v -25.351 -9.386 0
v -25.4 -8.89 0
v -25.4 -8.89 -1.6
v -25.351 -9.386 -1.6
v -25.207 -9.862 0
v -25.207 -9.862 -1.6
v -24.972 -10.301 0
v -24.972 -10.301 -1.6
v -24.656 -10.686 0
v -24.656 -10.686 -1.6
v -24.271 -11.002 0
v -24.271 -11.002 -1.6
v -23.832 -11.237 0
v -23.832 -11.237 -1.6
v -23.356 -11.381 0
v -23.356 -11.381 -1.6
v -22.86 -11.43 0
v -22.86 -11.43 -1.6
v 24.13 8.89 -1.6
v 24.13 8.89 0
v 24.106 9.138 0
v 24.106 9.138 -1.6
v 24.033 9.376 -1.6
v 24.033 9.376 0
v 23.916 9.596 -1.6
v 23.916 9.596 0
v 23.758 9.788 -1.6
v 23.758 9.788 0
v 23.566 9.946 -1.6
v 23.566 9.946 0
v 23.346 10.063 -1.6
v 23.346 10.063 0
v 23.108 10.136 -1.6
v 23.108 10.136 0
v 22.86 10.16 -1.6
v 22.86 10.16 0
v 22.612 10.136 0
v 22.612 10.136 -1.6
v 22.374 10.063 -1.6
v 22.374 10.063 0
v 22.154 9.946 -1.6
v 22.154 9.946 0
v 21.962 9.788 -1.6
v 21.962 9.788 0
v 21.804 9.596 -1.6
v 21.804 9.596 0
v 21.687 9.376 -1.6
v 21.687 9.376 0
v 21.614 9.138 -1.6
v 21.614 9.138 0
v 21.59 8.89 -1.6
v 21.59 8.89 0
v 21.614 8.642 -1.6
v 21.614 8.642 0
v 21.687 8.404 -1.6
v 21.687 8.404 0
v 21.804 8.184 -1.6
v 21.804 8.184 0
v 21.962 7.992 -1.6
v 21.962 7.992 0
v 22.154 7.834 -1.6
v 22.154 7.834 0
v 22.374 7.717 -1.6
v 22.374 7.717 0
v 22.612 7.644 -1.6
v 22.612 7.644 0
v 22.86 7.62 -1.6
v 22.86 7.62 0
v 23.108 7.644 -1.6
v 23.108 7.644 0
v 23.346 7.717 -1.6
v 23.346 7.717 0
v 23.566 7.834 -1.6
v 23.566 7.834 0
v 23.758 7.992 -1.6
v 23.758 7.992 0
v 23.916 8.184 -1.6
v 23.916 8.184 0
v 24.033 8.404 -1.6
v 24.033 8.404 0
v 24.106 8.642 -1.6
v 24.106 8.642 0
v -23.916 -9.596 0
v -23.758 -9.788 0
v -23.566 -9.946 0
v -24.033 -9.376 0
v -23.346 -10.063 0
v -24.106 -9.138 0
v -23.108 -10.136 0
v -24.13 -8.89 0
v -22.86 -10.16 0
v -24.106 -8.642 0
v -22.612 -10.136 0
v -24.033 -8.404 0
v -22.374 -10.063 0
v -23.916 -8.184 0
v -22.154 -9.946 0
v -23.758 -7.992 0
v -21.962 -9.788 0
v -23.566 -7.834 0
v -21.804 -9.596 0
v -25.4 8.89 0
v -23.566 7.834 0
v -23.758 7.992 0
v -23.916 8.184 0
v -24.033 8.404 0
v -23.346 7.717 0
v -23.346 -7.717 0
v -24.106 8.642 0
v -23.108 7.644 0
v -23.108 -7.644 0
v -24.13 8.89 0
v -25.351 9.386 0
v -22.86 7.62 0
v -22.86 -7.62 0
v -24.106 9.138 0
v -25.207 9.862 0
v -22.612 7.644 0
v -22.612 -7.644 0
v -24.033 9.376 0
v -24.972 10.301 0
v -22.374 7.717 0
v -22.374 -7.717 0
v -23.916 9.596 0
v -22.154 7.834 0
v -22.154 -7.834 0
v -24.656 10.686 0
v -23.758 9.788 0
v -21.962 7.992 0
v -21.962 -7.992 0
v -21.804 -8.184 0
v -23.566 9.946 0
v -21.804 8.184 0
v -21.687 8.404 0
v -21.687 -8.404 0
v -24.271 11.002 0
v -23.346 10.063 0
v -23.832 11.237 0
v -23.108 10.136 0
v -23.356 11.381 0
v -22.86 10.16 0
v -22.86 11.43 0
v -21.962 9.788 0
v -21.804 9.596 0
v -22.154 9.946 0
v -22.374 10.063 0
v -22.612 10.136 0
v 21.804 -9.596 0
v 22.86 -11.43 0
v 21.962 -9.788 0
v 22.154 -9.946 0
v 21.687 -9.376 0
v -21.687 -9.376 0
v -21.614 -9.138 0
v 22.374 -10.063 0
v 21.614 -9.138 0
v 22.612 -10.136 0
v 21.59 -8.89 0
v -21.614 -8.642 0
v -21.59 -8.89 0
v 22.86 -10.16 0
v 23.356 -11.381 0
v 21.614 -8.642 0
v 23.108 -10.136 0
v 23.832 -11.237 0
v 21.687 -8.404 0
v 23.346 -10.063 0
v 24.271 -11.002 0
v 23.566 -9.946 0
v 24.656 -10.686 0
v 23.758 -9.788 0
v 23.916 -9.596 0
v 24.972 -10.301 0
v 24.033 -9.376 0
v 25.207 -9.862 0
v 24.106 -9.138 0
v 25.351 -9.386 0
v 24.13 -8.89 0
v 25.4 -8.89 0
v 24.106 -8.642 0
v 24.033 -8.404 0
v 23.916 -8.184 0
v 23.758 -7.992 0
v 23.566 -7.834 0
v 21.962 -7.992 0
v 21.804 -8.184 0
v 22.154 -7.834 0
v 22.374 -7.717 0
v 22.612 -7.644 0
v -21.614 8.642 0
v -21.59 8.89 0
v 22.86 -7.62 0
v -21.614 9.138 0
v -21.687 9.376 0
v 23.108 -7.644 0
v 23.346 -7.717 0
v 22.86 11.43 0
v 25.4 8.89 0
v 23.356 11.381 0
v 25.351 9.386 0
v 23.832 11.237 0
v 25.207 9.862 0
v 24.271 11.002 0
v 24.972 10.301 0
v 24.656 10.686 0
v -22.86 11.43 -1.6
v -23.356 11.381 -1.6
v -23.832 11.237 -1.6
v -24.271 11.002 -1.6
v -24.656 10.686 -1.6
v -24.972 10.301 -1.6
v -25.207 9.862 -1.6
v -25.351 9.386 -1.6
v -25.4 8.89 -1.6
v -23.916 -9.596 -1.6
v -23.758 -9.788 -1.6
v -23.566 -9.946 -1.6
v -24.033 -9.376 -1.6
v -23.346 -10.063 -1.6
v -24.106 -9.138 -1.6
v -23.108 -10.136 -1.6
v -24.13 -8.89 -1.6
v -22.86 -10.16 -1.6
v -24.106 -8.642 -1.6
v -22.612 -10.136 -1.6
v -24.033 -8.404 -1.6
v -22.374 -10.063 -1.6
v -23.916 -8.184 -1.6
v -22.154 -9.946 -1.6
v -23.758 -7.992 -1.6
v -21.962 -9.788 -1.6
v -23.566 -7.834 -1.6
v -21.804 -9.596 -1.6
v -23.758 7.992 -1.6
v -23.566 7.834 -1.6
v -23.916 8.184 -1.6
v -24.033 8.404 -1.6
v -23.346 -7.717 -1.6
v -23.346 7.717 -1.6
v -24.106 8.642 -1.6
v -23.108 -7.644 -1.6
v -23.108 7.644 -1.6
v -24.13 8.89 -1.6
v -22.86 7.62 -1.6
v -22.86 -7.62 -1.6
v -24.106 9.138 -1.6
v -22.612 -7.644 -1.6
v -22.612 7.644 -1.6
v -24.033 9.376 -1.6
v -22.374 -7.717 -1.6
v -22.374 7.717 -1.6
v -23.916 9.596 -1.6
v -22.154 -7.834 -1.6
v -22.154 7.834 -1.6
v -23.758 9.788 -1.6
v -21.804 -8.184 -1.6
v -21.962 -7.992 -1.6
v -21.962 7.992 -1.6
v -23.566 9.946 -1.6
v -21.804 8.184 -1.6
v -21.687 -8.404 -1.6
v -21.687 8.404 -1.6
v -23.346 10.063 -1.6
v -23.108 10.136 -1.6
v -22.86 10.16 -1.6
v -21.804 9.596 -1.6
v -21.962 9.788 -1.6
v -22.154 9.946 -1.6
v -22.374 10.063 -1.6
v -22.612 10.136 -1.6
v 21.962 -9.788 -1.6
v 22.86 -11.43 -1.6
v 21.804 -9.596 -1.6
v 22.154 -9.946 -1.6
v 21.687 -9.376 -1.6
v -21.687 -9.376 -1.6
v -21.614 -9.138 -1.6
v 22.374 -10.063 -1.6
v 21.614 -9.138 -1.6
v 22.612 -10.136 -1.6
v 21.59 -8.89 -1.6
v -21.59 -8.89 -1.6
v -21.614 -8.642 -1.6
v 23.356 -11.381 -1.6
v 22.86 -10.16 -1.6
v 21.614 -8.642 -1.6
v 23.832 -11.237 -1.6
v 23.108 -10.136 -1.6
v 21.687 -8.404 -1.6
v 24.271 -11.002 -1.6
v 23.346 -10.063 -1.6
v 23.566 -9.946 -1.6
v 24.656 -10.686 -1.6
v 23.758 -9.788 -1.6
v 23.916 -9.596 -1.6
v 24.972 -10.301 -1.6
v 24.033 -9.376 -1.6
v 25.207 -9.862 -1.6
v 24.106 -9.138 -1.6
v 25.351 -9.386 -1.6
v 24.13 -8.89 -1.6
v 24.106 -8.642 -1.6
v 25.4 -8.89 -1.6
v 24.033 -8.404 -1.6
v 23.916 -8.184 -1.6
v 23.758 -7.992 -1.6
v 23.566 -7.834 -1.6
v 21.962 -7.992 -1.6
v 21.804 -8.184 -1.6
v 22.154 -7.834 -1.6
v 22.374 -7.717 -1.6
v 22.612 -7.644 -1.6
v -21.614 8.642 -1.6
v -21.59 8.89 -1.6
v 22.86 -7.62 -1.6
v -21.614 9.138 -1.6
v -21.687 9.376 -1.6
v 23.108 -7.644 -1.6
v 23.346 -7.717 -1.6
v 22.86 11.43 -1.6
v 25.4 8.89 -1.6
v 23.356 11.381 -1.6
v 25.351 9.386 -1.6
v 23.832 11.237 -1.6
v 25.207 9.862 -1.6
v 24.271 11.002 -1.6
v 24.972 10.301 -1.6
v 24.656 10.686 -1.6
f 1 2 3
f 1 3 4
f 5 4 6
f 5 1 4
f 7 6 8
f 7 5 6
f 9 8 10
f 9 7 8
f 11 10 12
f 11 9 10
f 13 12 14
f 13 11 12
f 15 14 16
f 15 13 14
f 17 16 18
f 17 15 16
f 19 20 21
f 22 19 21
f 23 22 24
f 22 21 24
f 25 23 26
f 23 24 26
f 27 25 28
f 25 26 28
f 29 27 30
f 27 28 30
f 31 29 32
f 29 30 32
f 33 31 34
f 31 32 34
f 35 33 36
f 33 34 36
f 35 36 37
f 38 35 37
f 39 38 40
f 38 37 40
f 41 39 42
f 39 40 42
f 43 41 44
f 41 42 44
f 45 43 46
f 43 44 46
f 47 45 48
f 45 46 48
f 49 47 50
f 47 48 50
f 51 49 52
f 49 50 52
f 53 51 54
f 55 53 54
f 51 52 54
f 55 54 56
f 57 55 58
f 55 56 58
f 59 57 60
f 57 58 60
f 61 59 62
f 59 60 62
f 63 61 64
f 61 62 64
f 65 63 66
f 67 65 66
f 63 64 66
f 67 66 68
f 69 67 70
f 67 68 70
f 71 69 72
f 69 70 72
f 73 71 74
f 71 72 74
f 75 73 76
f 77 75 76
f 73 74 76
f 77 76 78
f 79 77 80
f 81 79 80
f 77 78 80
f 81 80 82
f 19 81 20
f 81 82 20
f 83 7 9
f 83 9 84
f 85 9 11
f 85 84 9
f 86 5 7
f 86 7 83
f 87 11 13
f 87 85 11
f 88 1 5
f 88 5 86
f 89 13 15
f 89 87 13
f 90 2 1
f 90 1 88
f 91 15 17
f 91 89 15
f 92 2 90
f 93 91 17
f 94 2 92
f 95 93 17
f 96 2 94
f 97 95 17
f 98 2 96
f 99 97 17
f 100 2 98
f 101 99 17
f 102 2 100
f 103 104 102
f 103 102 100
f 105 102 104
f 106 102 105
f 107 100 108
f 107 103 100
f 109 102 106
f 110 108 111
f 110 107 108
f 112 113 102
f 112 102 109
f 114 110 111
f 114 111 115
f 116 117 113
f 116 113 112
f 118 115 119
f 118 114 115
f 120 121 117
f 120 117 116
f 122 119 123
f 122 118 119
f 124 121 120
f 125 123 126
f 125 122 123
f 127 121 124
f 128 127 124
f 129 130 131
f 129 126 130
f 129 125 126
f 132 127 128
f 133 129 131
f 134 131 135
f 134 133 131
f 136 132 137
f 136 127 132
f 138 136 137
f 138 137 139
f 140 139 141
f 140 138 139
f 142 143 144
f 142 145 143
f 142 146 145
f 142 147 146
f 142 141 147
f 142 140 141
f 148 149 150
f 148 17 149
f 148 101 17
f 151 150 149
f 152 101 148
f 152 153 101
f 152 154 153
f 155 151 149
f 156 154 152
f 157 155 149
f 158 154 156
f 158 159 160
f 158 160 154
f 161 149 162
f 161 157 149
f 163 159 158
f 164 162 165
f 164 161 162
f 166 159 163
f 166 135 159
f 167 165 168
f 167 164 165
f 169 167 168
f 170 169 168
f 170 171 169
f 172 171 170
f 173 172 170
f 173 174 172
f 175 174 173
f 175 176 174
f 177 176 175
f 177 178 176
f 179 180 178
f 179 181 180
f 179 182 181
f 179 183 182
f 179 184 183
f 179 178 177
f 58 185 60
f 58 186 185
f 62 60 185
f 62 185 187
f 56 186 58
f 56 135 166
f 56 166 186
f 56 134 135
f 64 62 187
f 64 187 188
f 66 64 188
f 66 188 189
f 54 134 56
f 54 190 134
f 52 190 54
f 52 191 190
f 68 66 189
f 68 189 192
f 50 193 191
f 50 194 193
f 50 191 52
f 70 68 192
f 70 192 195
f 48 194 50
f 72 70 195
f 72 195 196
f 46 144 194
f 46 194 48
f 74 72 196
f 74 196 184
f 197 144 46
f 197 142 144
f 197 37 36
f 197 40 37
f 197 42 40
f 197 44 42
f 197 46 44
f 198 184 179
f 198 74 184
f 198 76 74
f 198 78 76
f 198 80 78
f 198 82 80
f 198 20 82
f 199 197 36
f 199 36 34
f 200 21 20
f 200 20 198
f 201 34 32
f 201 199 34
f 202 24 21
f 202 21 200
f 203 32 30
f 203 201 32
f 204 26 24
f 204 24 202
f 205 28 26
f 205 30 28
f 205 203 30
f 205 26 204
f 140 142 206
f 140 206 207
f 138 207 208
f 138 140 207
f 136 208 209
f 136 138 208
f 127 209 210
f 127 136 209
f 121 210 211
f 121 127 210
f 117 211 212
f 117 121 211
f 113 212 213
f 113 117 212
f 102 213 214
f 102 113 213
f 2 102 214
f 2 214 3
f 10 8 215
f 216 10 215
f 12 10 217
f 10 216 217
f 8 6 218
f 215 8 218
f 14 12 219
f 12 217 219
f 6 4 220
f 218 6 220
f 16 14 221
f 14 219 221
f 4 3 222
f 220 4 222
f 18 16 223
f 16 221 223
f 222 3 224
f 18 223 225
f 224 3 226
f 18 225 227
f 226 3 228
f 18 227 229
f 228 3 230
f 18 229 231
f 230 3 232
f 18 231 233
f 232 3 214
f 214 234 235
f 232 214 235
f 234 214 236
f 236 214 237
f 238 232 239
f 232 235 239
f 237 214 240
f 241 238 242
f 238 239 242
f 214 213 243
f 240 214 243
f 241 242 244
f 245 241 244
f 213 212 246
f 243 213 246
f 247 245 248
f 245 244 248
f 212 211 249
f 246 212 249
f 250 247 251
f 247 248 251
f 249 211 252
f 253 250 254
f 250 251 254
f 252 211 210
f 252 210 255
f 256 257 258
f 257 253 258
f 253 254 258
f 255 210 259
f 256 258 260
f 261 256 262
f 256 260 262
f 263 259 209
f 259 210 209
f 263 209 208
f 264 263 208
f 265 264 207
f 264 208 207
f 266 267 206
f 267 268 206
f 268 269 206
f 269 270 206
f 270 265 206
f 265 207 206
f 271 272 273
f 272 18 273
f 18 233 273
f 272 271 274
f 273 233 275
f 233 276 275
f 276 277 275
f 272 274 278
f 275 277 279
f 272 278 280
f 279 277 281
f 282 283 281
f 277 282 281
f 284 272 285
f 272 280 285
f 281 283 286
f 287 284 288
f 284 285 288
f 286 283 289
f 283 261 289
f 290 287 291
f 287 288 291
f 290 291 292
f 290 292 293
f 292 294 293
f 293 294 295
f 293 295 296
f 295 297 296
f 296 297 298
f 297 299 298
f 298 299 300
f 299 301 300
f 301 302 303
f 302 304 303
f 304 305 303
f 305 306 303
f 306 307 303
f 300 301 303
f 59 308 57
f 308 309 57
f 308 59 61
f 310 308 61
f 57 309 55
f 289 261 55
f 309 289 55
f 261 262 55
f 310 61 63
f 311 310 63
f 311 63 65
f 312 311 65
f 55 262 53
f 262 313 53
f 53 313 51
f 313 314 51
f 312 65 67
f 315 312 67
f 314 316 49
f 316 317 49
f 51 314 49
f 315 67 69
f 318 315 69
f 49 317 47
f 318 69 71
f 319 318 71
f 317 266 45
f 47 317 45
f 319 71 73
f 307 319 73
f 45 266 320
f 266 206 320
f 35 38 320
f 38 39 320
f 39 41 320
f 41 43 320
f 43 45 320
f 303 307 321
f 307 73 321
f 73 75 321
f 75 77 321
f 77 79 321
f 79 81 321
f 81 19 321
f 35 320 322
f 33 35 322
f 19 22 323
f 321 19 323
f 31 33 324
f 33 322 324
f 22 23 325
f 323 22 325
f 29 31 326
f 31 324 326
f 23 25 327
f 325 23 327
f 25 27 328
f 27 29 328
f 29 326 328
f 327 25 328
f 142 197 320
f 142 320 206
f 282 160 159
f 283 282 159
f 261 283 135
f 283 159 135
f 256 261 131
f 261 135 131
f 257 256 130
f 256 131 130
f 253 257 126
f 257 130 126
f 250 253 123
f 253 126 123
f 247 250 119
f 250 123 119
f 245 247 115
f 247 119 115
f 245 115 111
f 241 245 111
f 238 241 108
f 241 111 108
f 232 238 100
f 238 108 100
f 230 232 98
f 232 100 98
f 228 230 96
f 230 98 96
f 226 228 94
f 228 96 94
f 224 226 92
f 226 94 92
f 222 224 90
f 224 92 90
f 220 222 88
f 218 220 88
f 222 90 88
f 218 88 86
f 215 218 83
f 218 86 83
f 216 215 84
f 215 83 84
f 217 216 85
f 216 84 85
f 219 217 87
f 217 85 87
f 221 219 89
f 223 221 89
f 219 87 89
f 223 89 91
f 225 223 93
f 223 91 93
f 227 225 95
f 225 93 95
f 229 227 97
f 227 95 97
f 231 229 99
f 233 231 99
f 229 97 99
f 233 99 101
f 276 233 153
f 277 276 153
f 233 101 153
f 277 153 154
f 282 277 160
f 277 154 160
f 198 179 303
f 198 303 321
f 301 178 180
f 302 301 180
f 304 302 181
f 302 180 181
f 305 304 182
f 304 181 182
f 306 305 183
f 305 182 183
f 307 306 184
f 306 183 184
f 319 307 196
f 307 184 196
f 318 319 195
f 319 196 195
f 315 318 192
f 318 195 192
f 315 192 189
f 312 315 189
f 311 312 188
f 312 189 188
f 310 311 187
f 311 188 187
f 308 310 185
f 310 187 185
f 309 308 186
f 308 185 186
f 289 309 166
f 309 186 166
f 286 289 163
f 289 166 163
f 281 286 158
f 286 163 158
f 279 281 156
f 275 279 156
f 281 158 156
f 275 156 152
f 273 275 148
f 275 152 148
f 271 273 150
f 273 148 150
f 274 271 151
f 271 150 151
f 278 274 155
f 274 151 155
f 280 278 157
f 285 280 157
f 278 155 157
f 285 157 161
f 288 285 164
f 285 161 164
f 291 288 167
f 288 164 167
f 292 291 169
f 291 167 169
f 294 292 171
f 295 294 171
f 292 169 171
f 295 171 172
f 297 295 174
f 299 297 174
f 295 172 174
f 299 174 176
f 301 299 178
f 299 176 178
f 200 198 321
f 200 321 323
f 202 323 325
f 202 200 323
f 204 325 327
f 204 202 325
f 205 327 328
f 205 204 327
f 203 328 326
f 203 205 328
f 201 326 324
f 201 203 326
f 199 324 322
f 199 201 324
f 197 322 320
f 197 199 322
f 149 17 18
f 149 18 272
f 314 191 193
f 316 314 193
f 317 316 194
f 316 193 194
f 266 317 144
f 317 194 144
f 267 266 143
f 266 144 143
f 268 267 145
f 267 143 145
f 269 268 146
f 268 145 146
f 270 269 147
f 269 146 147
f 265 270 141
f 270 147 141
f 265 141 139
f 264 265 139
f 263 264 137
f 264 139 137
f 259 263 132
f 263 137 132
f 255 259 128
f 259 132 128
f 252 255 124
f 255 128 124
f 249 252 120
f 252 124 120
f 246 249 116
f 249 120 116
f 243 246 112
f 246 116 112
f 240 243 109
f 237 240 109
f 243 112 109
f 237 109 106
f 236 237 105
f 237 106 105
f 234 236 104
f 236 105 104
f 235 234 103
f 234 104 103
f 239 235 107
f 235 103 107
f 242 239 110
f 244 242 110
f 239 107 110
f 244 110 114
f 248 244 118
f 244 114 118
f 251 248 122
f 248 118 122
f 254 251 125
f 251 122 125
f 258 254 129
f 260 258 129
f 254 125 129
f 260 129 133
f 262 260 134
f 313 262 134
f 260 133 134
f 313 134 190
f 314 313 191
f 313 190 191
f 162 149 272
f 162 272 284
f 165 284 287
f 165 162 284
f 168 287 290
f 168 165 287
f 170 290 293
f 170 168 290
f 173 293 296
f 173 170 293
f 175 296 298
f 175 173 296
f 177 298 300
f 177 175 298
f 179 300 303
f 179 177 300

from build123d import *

# Parameters (mm, degrees)
F0_R     = 1.27
F1_DEPTH = 1.6


with BuildPart() as f1:
    # F0 (on Top) → F1 (new body)
    with BuildSketch(Plane.XY):
        with BuildLine():
            Line((22.86, 11.43), (-22.86, 11.43))
            ThreePointArc((-22.86, 11.43), (-24.656051, 10.686051), (-25.4, 8.89))
            Line((-25.4, 8.89), (-25.4, -8.89))
            ThreePointArc((-25.4, -8.89), (-24.656051, -10.686051), (-22.86, -11.43))
            Line((-22.86, -11.43), (22.86, -11.43))
            ThreePointArc((22.86, -11.43), (24.656051, -10.686051), (25.4, -8.89))
            Line((25.4, -8.89), (25.4, 8.89))
            ThreePointArc((25.4, 8.89), (24.656051, 10.686051), (22.86, 11.43))
        make_face()
        with Locations((-22.86, -8.89)):
            Circle(F0_R, mode=Mode.SUBTRACT)
        with Locations((22.86, -8.89)):
            Circle(F0_R, mode=Mode.SUBTRACT)
        with Locations((-22.86, 8.89)):
            Circle(F0_R, mode=Mode.SUBTRACT)
        with Locations((22.86, 8.89)):
            Circle(F0_R, mode=Mode.SUBTRACT)
    extrude(amount=-F1_DEPTH)


solid = f1.part
